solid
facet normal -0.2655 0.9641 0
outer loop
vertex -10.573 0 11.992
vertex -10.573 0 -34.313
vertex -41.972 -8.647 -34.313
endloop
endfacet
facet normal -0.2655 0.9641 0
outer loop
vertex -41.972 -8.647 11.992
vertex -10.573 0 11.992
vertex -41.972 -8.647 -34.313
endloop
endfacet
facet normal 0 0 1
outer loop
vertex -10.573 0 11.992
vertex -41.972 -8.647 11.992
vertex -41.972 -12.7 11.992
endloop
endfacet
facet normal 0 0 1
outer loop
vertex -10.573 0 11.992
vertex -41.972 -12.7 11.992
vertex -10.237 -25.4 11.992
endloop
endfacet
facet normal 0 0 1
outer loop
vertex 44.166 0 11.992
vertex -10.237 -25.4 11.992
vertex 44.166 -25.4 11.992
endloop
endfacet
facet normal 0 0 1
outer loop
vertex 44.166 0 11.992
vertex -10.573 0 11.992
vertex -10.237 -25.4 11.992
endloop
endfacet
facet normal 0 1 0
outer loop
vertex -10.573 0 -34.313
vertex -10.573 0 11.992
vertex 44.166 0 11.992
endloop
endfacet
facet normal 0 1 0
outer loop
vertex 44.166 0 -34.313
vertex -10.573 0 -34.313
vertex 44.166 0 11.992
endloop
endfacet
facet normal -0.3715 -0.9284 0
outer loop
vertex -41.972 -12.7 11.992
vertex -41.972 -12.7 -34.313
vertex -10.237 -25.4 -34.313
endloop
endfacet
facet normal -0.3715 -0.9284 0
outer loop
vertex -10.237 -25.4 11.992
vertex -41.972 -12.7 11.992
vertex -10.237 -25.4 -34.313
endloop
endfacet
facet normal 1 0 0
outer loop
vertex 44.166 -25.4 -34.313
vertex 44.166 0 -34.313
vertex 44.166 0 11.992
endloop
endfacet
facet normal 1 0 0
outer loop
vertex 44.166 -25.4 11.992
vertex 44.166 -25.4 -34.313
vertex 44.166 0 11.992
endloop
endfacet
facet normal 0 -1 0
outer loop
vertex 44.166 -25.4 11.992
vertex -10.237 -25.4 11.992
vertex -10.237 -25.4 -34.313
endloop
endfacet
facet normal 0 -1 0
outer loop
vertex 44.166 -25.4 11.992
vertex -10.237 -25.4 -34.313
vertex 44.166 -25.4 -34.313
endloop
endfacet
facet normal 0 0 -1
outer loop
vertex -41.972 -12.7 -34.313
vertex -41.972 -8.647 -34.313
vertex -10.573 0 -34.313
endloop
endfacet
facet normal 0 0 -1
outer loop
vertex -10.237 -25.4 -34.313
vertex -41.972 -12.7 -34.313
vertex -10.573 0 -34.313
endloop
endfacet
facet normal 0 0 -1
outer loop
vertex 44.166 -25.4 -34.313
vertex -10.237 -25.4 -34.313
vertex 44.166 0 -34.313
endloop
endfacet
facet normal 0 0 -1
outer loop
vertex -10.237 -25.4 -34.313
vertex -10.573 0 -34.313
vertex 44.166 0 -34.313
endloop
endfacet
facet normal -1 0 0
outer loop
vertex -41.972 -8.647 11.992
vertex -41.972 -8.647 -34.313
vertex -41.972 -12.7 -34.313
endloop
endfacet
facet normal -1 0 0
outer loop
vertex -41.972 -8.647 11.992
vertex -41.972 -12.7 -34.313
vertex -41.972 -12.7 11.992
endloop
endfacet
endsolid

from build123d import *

# Parameters (mm, degrees)
F0_W     = 86.138785
F0_H     = 46.305328
F1_DEPTH = 25.4
F3_DEPTH = 48.26
F5_DEPTH = 50.8


with BuildPart() as f1:
    # F0 (on Front) → F1 (new body)
    with BuildSketch(Plane.XZ):
        with Locations((1.097095, -11.160776)):
            Rectangle(F0_W, F0_H)
    extrude(amount=F1_DEPTH)

    # F2 (on face) → F3 (cut)
    with BuildSketch(Plane(origin=(0, 0, -34.31344), x_dir=(1, 0, 0), z_dir=(0, 0, -1))):
        Polygon((-41.972298, 12.7), (-10.236957, 25.4), (-41.972298, 25.4), align=None)
    extrude(amount=-F3_DEPTH, mode=Mode.SUBTRACT)

    # F4 (on face) → F5 (cut)
    with BuildSketch(Plane(origin=(0, 0, -34.31344), x_dir=(1, 0, 0), z_dir=(0, 0, -1))):
        Polygon((-41.972298, 0), (-10.572781, 0), (-41.972298, 8.64746), align=None)
    extrude(amount=-F5_DEPTH, mode=Mode.SUBTRACT)


solid = f1.part
